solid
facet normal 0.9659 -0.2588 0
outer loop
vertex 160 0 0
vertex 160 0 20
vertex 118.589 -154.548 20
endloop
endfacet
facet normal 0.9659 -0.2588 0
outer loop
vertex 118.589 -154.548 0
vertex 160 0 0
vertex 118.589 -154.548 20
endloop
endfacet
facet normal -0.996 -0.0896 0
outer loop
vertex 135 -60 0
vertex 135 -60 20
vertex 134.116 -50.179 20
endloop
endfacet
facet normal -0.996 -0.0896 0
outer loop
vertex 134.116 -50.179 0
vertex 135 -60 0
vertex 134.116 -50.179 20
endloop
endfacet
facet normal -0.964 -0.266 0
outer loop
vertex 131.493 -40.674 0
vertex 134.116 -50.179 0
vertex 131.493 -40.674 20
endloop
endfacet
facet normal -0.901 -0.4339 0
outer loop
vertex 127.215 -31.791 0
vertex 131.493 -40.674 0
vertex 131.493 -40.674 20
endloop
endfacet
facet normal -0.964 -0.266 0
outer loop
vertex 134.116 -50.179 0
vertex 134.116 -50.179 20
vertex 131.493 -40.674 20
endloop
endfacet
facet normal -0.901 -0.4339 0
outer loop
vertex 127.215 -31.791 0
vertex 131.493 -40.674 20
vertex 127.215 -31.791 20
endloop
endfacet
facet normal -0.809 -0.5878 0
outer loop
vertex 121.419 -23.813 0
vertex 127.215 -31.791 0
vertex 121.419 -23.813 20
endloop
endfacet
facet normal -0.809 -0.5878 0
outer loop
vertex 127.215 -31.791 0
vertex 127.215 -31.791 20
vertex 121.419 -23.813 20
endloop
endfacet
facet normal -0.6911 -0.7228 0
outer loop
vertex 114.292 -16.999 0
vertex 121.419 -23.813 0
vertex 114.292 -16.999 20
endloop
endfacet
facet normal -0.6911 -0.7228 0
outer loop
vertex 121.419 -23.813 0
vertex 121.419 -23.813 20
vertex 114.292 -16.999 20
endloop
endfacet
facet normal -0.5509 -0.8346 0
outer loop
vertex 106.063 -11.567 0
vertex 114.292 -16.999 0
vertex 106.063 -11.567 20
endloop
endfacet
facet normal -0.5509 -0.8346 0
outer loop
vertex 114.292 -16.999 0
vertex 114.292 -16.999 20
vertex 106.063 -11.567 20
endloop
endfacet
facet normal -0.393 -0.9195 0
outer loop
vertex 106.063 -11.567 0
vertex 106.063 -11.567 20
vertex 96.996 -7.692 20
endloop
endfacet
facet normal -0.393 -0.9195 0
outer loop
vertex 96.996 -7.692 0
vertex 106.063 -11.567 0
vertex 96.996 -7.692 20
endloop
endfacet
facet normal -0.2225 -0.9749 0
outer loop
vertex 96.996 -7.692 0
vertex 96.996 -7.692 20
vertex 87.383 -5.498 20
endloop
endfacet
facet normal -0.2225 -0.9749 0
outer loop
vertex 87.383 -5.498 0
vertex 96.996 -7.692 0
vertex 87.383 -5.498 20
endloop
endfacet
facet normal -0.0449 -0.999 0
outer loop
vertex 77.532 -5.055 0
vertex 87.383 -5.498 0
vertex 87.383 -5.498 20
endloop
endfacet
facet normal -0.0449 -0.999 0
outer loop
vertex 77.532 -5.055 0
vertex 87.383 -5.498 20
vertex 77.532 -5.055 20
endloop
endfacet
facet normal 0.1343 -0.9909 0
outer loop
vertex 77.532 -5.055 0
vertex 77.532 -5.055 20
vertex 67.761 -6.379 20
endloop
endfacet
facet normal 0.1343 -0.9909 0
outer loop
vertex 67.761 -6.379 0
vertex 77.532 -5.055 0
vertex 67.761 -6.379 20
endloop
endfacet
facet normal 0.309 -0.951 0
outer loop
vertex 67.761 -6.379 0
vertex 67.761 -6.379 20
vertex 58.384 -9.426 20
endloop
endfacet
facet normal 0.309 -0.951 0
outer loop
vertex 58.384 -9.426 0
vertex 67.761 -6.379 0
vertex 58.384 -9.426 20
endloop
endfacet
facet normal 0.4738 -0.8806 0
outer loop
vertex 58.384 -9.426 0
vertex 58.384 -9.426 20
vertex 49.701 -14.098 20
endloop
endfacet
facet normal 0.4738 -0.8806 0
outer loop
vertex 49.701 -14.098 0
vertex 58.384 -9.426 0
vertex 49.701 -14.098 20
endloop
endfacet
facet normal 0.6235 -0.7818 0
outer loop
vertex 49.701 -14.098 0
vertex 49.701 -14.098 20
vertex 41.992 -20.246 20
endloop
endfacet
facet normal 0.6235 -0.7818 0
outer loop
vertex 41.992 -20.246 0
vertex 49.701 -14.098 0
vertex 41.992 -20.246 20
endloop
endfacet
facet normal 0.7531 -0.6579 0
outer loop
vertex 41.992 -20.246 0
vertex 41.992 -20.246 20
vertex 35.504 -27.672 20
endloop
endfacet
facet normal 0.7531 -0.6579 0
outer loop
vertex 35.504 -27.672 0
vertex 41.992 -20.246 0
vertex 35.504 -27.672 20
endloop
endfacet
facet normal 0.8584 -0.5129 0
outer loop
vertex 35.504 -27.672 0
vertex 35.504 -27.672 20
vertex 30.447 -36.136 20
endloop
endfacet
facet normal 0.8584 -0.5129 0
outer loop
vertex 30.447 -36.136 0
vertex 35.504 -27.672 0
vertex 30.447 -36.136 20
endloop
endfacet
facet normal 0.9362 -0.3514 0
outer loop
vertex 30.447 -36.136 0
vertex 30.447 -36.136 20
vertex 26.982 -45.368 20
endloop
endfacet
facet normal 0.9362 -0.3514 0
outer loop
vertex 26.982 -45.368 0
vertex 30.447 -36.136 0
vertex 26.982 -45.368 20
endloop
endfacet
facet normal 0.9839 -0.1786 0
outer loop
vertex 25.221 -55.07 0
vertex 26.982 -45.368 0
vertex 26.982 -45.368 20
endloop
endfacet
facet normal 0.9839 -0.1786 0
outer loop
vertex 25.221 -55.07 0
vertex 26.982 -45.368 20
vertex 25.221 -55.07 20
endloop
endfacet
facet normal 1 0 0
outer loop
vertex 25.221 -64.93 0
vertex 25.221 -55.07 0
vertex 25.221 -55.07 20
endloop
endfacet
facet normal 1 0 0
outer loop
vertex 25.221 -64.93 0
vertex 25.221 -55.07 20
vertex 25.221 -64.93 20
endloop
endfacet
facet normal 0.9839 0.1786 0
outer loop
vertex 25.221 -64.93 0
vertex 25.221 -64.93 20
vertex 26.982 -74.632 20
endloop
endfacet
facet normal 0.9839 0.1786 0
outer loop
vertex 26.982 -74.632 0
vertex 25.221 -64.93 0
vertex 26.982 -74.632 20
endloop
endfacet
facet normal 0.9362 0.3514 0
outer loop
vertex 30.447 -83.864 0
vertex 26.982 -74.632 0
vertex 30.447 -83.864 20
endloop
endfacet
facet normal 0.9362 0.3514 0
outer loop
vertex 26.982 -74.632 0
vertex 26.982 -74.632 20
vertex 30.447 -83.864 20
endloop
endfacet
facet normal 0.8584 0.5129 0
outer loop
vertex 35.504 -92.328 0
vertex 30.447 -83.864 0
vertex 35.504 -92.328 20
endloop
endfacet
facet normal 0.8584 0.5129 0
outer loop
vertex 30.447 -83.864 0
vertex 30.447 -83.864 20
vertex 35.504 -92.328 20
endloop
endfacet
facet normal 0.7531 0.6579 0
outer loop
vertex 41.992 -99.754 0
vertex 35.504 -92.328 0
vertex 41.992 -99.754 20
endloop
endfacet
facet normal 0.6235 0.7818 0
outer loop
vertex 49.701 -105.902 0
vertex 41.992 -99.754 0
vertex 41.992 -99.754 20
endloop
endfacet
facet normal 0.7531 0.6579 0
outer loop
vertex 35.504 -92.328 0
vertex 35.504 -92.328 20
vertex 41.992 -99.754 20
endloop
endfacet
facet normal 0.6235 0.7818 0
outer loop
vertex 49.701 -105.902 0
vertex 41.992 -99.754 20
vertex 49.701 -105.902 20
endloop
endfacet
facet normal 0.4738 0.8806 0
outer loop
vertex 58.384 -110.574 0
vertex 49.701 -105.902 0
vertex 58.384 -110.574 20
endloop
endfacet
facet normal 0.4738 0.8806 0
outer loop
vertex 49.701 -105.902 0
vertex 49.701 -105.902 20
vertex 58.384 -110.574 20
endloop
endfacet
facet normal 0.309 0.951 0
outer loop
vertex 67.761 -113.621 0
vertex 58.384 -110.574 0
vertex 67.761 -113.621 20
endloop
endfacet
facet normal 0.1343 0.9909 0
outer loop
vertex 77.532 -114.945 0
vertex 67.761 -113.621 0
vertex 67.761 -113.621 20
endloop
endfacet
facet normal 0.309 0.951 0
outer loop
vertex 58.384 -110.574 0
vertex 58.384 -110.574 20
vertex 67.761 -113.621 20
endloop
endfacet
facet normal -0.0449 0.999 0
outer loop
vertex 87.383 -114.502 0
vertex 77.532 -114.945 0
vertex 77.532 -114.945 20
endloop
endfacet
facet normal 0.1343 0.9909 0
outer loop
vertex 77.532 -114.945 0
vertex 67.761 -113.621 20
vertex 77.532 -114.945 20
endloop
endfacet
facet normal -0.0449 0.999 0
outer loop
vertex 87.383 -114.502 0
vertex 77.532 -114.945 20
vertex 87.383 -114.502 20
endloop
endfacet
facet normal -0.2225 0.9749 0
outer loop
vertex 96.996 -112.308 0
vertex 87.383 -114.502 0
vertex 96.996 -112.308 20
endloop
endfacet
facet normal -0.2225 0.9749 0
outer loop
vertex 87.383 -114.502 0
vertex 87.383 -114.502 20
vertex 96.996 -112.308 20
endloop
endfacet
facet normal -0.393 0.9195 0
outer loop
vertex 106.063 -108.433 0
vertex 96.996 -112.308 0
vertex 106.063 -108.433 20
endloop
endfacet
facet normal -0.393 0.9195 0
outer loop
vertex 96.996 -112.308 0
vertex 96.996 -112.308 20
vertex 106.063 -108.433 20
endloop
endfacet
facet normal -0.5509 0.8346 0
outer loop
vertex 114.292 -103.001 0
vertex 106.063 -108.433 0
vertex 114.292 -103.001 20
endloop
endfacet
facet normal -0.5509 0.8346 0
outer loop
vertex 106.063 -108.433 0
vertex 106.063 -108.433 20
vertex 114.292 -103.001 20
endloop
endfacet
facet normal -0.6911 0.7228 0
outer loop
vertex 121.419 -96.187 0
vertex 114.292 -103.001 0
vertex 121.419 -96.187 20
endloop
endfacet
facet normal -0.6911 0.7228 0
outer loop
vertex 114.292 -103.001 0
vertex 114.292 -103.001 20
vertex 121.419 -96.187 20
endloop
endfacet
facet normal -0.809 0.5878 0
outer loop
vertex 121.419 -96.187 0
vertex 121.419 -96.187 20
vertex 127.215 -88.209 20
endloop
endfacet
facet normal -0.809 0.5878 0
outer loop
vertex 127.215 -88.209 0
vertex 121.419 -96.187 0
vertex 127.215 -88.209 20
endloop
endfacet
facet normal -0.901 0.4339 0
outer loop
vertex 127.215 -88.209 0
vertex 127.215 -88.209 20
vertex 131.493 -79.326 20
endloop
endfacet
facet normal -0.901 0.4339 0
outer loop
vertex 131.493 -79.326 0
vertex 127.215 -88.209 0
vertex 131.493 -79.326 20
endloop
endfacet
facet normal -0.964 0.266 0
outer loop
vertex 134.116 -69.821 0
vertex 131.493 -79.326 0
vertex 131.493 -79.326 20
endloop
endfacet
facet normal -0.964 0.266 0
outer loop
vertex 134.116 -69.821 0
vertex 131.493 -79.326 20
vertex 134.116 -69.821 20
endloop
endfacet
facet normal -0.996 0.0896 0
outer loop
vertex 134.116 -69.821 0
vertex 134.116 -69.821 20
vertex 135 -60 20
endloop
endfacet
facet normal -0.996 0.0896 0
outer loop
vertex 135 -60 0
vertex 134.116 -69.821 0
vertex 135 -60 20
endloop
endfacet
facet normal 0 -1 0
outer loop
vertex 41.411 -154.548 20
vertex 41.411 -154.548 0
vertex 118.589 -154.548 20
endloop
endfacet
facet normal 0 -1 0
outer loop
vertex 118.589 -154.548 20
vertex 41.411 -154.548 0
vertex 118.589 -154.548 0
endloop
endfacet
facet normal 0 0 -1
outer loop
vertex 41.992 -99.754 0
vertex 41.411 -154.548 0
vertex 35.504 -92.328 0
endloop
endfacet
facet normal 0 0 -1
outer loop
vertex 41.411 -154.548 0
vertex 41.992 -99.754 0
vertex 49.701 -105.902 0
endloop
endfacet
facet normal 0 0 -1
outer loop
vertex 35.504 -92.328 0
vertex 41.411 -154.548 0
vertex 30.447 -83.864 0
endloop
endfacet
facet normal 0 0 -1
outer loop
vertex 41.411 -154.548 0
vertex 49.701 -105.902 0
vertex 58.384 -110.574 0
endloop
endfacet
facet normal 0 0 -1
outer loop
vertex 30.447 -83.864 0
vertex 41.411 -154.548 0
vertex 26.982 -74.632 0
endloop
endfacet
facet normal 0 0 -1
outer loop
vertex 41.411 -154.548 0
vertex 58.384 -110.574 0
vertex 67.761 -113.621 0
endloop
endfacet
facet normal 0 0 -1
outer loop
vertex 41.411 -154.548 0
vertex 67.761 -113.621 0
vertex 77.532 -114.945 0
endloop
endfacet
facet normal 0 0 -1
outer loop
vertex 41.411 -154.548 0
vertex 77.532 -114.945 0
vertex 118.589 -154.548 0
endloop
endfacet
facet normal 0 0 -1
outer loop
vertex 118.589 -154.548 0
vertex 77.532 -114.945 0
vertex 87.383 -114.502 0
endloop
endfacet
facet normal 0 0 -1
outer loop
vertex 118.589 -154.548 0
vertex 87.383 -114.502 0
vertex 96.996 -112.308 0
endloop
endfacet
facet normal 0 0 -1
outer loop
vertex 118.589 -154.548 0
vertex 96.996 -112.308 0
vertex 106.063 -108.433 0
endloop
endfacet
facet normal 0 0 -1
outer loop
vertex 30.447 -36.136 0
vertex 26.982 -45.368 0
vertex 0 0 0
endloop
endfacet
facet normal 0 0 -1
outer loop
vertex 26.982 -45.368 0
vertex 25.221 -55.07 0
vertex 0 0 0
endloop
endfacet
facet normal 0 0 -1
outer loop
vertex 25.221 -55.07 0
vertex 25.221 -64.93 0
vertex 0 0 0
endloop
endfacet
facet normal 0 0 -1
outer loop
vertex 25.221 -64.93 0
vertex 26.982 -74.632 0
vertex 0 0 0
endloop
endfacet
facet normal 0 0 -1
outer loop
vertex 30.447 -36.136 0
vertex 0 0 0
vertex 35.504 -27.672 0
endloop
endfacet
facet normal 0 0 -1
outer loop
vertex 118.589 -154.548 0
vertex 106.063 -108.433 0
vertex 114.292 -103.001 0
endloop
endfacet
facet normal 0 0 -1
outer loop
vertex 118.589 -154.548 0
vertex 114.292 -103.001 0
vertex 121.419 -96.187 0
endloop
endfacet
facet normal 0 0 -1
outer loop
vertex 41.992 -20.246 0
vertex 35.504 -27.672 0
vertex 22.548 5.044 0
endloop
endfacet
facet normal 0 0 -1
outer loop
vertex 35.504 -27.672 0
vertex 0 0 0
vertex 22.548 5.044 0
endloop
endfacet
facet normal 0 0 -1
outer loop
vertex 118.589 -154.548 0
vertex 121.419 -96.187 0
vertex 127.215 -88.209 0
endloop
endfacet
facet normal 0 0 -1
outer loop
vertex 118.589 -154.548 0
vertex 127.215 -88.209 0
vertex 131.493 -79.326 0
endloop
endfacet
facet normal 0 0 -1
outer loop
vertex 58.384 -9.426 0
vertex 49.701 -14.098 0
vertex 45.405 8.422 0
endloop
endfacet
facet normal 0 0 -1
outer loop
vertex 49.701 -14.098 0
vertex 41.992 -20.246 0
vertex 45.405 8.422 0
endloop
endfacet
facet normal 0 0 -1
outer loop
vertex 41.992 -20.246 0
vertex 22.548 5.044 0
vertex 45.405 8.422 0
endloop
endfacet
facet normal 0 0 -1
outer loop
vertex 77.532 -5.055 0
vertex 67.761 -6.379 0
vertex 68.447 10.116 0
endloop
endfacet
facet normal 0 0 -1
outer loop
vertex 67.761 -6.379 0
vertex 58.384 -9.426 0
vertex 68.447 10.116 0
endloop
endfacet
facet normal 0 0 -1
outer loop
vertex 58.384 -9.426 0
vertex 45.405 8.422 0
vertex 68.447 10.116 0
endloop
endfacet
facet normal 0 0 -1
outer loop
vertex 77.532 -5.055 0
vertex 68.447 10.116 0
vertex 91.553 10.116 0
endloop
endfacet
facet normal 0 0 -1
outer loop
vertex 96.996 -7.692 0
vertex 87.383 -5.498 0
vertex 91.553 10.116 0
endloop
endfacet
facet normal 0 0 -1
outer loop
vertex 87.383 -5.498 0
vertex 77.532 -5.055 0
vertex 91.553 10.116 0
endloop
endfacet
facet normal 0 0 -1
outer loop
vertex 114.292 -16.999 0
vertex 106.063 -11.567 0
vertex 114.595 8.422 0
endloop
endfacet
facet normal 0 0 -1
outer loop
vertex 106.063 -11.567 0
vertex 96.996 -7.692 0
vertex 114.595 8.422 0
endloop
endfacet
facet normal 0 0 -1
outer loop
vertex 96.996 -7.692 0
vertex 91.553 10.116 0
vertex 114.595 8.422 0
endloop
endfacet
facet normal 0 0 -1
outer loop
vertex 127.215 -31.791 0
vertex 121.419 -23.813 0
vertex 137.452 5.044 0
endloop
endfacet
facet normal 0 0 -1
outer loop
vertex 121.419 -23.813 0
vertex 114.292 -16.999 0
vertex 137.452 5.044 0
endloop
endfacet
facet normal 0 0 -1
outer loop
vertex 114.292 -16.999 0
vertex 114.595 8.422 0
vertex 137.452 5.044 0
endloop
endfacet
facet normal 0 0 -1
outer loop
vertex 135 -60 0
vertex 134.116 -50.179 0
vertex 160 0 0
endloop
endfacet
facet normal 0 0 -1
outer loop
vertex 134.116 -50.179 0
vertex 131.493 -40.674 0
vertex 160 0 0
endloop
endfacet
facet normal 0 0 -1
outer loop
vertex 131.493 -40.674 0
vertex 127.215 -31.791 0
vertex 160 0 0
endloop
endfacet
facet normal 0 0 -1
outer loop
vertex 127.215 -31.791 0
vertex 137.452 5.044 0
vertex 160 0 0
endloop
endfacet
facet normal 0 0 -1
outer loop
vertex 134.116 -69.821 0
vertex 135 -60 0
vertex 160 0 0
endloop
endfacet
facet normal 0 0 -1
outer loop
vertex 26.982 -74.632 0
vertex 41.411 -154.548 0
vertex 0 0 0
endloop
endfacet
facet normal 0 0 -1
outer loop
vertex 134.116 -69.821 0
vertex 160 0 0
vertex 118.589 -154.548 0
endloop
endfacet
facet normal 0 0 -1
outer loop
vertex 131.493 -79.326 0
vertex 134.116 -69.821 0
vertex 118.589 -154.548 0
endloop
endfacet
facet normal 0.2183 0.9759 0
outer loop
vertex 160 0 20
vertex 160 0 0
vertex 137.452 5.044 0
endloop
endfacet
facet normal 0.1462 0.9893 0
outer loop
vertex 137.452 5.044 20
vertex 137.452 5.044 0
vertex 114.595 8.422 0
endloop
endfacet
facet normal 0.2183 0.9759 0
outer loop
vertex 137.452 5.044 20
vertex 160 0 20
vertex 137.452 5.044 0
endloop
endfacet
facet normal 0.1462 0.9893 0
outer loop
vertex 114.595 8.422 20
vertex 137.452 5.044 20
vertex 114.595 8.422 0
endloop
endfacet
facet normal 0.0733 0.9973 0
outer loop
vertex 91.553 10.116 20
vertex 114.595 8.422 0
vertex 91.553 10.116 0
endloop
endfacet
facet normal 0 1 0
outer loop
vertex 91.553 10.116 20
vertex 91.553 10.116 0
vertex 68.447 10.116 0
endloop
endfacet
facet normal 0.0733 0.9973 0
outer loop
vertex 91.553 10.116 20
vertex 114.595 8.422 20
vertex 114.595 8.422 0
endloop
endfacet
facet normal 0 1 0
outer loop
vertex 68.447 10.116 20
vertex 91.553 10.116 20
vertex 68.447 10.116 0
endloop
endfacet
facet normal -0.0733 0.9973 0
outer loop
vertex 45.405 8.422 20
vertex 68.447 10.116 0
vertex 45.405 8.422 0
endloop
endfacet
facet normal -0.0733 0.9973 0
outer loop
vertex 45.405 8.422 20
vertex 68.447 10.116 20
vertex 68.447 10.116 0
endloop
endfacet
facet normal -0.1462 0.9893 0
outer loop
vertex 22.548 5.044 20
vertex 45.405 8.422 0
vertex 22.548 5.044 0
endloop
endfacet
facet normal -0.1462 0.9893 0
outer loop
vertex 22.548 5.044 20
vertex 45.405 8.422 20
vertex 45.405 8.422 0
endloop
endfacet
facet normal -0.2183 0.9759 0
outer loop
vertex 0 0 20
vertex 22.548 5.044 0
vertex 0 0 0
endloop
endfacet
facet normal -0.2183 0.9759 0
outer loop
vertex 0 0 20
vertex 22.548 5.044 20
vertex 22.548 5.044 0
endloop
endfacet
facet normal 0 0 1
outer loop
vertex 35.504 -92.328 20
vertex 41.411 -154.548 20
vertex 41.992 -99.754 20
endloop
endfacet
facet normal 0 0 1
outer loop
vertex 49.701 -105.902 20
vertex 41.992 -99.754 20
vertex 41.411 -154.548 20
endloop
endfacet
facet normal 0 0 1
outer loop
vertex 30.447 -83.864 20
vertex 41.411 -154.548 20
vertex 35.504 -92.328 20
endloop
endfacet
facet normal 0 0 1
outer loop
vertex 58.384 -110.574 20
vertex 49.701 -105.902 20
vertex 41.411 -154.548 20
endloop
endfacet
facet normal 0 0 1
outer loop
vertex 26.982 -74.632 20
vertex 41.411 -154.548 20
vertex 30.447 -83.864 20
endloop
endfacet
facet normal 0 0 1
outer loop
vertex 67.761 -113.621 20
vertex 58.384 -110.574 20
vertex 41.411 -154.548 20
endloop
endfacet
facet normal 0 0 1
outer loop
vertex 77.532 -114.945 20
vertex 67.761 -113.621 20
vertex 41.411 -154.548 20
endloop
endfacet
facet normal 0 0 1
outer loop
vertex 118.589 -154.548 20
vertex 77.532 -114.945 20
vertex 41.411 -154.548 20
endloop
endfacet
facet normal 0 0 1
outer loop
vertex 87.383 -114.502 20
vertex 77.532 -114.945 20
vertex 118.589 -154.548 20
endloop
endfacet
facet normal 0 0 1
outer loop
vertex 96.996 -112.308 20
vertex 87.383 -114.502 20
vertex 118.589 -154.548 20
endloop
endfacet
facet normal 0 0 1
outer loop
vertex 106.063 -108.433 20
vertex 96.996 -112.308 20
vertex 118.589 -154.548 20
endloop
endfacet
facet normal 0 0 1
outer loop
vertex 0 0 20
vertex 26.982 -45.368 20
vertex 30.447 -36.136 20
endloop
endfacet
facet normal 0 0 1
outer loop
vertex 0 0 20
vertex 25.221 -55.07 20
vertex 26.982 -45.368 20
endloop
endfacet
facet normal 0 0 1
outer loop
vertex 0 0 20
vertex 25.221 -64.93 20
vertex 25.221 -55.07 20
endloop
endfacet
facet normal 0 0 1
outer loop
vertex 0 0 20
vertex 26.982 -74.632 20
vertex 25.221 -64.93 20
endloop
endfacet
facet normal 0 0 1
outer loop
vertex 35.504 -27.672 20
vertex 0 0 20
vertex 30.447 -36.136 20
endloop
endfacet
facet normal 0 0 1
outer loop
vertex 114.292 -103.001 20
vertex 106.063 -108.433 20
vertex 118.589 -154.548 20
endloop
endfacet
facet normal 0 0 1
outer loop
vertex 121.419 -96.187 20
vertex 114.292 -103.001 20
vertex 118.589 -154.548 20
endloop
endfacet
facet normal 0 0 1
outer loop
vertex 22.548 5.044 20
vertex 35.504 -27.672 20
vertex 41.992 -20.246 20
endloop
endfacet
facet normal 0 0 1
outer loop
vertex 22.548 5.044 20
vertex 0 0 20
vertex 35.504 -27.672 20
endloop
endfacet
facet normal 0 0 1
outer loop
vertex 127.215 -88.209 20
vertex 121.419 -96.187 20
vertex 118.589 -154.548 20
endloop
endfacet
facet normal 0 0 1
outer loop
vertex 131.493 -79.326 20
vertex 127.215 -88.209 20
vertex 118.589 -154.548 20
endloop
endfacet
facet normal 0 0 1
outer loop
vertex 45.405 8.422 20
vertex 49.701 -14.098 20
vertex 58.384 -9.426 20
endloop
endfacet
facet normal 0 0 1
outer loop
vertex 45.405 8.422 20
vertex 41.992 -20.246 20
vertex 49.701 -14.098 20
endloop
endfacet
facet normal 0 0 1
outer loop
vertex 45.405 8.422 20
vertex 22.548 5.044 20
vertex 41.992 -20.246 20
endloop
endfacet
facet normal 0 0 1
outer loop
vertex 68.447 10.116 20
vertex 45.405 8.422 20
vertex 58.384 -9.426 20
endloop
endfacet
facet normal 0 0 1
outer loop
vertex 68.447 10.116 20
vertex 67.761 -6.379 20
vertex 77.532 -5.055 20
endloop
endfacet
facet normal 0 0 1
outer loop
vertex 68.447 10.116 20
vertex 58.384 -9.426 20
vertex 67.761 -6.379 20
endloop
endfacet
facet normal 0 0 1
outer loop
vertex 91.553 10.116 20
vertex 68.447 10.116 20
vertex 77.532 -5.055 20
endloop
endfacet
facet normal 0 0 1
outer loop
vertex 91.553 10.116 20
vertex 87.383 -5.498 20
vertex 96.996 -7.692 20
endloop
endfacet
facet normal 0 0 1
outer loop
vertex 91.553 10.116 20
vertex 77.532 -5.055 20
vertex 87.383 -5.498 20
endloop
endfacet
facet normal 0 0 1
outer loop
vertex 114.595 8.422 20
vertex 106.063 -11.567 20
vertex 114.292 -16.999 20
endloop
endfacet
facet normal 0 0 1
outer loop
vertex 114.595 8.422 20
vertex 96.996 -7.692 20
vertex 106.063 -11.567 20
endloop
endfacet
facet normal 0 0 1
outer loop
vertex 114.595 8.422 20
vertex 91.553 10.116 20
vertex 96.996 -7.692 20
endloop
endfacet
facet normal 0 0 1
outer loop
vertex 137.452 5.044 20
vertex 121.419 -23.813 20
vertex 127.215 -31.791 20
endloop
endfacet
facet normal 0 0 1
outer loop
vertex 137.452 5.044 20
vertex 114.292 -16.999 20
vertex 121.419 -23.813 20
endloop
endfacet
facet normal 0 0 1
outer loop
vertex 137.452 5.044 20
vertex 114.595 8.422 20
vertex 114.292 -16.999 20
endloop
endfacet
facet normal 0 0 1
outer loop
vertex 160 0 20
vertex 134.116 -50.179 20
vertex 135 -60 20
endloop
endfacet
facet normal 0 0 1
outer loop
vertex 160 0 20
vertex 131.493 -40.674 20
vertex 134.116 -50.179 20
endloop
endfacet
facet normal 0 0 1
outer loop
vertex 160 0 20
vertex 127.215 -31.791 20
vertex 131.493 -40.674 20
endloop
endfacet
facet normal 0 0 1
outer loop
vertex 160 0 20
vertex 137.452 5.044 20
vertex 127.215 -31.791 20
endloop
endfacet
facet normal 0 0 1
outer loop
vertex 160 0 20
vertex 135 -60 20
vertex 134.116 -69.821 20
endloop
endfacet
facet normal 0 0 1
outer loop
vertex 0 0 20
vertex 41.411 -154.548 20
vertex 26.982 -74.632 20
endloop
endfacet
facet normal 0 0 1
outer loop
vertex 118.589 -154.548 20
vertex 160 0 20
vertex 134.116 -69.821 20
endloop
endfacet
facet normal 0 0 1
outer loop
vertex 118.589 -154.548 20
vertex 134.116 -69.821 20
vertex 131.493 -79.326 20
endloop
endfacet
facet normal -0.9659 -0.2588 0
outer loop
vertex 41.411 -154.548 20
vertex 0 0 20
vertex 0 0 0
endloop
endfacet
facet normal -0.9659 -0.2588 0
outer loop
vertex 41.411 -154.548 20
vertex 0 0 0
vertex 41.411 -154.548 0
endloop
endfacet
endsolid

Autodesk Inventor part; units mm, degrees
ref_plane "YZ Plane" through (0, 0, 0) normal (1, 0, 0) x (0, 1, 0)
ref_plane "XZ Plane" through (0, 0, 0) normal (0, 1, 0) x (-1, 0, 0)
ref_plane "XY Plane" through (0, 0, 0) normal (0, 0, 1) x (1, 0, 0)
sketch "Sketch1" plane through (0, 0, 0) normal (0, 0, 1) x (1, 0, 0)
  line L0 (0, 0) -> (160, 0)
  line L1 (160, 0) -> (118.589, -154.5481)
  line L2 (0, 0) -> (41.411, -154.5481)
  line L3 (41.411, -154.5481) -> (118.589, -154.5481)
  dimension "d0" = 160
  dimension "d1" = 160
  dimension "d2" = 160
  dimension "d3" = 75
  dimension "d4" = 75
extrude "Extrusion1" add sketch "Sketch1" along normal blind 20
sketch "Sketch5" plane through (0, 0, 20) normal (0, 0, 1) x (1, 0, 0)
  line L0 (160, 0) -> (0, 0) projected
  line L1 (160, 0) -> (256.5926, -25.8819)
  line L2 (118.589, -154.5481) -> (41.411, -154.5481) projected
  line L3 (118.589, -154.5481) -> (215.1815, -180.43)
  circle A0 centre (235.8871, -103.156) radius 80 construction
  arc A1 (215.1815, -180.43) -> (256.5926, -25.8819) centre (235.8871, -103.156) ccw
  line L4 (160, 0) -> (118.589, -154.5481)
  line L5 (0, 0) -> (41.411, -154.5481) projected
  line L6 (0, 0) -> (-96.5926, -25.8819)
  line L7 (41.411, -154.5481) -> (118.589, -154.5481) projected
  line L8 (41.411, -154.5481) -> (-55.1815, -180.43)
  circle A2 centre (-75.8871, -103.156) radius 80 construction
  arc A3 (-96.5926, -25.8819) -> (-55.1815, -180.43) centre (-75.8871, -103.156) ccw
  point P0 (90, 0)
  dimension "d25" = 100
  dimension "d26" = 100
  dimension "d27" = 160
  dimension "d30" = 100
  dimension "d31" = 100
  dimension "d32" = 160
extrude "Extrusion5" add sketch "Sketch5" against normal blind 20 contours L1 A1 L3 L4 | L5 L8 A3 L6
sketch "Sketch8" plane through (0, 0, 20) normal (0, 0, 1) x (1, 0, 0)
  line L0 (41.411, -154.5481) -> (118.589, -154.5481) projected
  line L1 (0, 0) -> (41.411, -154.5481)
  line L2 (0, 0) -> (160, 0) projected
  line L3 (160, 0) -> (118.589, -154.5481)
  line L4 (0, 0) -> (160, 0)
  line L5 (0, 0) -> (-96.5926, -25.8819) projected
  arc A0 (-96.5926, -25.8819) -> (-55.1815, -180.43) centre (-75.8871, -103.156) ccw projected
  line L6 (-55.1815, -180.43) -> (41.411, -154.5481) projected
  line L7 (215.1815, -180.43) -> (118.589, -154.5481) projected
  arc A1 (215.1815, -180.43) -> (256.5926, -25.8819) centre (235.8871, -103.156) ccw projected
  line L8 (160, 0) -> (256.5926, -25.8819) projected
  line L9 (160, 0) -> (0, 0) projected
  line L10 (160, 0) -> (256.5926, -25.8819) projected
  line L11 (0, 0) -> (160, 0)
  point P0 (90, 0)
  point P1 (70, 0)
extrude "Extrusion7" cut sketch "Sketch8" against normal through all contours L6 A0 L5 L1 | L3 L8 A1 L7
sketch "Sketch9" plane through (0, 0, 20) normal (0, 0, 1) x (1, 0, 0)
  circle A0 centre (80, -304.672) radius 315
  line L0 (0, 0) -> (160, 0)
  dimension "d37" = 630
extrude "Extrusion8" add sketch "Sketch9" against normal blind 20 contours L0 A0 picked at (60.8492, 1.6815)
sketch "Sketch10" plane through (0, 0, 20) normal (0, 0, 1) x (1, 0, 0)
  circle A0 centre (80, -60) radius 55
  line L0 (41.411, -154.5481) -> (118.589, -154.5481) projected
  point P0 (0, 0)
  point P1 (80, -154.5481)
  dimension "d40" = 110
  dimension "d41" = 60
extrude "Extrusion9" cut sketch "Sketch10" against normal through all
properties part number "HA002" material "ABS Plastic"
